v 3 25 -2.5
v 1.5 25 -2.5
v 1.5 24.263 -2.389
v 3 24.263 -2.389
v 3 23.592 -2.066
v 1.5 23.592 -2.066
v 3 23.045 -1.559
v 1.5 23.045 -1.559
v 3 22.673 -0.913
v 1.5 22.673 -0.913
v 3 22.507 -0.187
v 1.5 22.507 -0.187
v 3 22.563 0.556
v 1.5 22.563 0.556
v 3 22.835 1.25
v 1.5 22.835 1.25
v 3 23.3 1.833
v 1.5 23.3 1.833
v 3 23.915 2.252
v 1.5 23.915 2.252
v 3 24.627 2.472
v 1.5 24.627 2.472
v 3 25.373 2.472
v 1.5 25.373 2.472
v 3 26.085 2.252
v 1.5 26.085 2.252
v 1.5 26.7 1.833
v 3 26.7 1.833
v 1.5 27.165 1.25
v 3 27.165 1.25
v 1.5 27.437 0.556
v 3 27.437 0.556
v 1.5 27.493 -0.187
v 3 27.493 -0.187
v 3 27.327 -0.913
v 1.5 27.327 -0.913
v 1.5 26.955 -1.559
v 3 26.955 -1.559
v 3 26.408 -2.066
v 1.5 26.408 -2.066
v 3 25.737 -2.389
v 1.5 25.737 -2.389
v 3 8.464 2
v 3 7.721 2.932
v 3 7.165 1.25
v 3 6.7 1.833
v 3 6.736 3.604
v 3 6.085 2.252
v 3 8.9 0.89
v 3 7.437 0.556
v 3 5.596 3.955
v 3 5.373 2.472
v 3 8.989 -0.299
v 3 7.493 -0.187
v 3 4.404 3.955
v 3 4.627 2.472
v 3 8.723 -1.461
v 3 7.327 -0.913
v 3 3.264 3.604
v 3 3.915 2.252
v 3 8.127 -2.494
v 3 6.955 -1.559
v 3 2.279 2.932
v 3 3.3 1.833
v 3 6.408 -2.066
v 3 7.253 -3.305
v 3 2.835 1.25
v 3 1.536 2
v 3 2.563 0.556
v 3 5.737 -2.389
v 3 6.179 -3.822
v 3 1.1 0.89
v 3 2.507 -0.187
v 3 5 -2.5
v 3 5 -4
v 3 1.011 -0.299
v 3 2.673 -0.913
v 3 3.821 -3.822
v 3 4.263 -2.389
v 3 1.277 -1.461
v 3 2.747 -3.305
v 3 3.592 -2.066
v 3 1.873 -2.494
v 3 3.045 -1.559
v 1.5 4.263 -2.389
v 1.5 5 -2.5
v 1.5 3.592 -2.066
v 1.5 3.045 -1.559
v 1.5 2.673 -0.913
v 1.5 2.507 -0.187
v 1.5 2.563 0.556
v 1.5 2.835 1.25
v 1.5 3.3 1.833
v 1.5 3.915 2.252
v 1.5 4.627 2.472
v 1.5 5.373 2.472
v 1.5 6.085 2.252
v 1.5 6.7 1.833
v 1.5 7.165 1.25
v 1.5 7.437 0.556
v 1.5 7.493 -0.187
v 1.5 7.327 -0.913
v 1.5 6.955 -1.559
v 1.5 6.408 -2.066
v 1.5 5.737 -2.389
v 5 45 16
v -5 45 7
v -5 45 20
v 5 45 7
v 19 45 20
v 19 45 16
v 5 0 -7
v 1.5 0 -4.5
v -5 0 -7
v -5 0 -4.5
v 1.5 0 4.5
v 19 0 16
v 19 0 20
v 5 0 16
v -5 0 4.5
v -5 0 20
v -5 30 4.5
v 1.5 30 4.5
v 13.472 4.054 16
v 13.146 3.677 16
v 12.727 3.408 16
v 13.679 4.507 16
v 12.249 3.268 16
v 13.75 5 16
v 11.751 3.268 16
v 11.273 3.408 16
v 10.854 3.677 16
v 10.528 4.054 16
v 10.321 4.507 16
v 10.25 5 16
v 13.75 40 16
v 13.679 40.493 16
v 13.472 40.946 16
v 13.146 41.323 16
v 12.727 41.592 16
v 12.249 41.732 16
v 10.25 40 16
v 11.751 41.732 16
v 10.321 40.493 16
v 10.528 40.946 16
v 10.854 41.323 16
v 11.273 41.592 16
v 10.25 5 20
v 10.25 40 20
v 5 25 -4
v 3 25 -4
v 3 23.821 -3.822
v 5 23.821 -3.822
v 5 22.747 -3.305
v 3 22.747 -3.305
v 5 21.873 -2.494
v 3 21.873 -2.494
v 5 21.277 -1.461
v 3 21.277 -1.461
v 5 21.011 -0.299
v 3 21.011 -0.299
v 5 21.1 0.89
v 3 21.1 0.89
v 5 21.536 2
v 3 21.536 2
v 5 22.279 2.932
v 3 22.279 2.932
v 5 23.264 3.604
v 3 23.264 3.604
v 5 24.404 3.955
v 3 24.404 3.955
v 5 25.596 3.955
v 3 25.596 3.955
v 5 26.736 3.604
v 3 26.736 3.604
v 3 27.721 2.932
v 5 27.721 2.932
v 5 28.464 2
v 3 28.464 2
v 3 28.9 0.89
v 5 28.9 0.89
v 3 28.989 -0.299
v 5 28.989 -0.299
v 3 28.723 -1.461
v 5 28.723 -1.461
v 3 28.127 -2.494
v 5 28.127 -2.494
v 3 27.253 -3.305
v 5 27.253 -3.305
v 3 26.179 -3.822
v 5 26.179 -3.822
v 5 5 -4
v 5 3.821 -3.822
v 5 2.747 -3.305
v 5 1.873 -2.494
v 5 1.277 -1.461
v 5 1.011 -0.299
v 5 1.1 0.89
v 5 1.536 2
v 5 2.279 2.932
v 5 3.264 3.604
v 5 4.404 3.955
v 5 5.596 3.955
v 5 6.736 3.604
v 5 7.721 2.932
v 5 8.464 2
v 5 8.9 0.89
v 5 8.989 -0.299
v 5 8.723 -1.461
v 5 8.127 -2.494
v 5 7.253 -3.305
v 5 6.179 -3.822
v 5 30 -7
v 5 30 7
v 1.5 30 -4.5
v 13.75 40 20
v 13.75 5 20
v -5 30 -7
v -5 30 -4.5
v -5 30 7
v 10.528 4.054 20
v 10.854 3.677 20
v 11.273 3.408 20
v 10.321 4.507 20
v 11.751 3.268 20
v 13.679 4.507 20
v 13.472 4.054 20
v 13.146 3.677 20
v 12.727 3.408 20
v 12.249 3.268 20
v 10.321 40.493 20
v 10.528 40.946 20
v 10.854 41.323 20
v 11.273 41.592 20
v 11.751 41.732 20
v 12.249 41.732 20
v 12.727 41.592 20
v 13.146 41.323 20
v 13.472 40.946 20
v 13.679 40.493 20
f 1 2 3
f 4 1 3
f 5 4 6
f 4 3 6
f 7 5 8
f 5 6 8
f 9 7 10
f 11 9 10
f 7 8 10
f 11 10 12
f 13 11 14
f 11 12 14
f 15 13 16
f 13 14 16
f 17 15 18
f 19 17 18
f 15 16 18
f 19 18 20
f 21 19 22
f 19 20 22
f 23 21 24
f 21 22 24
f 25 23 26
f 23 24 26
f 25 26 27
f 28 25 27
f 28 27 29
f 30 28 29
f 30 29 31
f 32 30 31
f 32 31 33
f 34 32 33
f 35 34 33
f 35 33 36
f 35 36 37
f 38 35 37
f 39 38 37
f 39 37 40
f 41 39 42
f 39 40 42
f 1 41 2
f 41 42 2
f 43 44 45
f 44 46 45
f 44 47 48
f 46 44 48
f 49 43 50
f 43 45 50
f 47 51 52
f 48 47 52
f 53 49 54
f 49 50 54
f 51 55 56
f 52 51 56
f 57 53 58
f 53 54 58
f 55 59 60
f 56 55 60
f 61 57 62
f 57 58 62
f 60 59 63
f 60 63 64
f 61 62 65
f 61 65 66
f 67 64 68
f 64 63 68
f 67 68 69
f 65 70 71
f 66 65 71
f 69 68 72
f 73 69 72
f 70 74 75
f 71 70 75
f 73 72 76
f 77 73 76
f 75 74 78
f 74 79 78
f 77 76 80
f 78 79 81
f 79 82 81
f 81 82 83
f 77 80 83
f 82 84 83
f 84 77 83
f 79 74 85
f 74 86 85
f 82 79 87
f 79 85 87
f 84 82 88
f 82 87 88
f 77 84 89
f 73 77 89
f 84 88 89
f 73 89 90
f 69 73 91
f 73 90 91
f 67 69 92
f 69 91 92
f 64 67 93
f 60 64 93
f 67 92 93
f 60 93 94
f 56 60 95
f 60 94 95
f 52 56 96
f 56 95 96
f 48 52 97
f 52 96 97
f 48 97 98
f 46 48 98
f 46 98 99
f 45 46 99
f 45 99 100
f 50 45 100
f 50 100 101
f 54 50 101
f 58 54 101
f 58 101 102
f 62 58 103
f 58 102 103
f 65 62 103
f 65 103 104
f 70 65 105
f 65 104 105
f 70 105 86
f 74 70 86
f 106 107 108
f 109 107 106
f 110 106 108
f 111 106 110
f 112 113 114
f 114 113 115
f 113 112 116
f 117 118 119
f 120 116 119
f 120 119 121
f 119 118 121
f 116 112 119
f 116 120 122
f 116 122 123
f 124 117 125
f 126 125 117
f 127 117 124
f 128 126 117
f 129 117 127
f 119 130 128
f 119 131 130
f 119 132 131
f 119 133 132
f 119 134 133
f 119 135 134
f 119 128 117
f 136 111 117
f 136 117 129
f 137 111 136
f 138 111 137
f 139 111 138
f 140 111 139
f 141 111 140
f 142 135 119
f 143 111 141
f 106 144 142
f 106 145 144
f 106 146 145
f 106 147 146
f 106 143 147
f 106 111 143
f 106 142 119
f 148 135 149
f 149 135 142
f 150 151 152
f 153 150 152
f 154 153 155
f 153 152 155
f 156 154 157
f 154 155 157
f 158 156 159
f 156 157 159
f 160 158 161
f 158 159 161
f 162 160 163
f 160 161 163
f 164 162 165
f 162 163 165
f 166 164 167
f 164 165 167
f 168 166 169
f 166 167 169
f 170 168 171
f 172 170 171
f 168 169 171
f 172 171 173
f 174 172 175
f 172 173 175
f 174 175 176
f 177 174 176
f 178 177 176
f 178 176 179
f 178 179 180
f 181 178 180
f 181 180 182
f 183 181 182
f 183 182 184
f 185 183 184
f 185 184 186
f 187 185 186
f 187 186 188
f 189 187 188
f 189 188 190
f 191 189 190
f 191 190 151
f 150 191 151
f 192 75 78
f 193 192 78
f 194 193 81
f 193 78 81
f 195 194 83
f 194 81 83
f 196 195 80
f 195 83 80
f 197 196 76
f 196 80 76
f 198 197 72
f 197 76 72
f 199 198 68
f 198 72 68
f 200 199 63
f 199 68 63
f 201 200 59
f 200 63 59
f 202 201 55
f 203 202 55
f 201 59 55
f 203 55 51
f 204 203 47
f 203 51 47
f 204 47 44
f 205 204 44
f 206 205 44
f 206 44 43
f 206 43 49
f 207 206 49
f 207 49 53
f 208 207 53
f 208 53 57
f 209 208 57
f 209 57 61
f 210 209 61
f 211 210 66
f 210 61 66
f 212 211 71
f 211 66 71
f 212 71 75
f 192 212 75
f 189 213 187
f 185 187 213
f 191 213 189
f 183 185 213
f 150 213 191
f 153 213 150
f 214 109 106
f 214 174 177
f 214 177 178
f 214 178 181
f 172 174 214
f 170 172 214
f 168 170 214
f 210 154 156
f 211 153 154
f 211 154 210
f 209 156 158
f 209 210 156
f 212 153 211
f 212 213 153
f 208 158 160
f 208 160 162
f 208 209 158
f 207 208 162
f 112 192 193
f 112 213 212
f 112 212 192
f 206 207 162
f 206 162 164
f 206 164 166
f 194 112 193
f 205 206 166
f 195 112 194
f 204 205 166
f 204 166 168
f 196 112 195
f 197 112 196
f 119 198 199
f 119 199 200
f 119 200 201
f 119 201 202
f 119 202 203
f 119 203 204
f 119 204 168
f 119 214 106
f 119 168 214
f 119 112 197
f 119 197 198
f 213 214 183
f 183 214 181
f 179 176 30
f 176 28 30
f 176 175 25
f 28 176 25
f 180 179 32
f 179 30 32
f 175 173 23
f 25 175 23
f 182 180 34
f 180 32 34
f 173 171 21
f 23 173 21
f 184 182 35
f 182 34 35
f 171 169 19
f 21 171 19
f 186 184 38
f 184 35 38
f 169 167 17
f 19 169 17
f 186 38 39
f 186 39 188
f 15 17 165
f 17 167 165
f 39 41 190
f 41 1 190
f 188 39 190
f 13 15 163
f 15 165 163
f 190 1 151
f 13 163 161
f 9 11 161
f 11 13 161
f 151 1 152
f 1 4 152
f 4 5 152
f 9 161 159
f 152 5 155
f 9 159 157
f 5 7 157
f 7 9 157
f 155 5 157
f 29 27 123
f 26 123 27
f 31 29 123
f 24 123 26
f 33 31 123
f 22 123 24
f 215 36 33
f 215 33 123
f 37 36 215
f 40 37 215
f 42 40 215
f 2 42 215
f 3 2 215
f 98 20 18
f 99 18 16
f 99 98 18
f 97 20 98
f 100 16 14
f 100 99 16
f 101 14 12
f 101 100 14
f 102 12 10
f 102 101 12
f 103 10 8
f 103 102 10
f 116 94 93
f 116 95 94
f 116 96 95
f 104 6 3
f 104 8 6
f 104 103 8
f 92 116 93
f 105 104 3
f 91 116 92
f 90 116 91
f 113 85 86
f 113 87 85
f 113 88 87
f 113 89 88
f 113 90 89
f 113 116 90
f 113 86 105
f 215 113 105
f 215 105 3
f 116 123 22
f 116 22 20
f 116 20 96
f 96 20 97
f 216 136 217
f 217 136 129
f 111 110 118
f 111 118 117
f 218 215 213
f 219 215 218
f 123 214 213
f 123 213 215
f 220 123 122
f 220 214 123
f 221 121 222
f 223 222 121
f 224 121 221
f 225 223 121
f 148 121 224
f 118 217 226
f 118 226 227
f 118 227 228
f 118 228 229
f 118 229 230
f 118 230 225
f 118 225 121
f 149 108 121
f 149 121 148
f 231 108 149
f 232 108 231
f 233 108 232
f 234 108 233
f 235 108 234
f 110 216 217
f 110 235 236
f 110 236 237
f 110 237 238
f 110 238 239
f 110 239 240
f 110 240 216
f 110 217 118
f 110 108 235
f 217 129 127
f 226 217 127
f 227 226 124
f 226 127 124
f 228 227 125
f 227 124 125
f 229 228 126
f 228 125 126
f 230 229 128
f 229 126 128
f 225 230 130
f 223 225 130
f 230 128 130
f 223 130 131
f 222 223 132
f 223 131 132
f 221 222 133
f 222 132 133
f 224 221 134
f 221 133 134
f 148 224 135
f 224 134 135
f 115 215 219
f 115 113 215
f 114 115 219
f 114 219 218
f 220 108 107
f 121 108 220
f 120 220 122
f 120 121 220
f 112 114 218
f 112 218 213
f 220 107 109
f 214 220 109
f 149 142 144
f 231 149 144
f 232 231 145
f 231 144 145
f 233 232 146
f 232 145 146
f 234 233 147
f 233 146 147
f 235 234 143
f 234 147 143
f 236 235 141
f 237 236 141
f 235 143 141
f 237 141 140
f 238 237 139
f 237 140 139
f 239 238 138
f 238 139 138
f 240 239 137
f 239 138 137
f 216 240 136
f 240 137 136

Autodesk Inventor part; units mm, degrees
ref_plane "YZ Plane" through (0, 0, 0) normal (1, 0, 0) x (0, 1, 0)
ref_plane "XZ Plane" through (0, 0, 0) normal (0, 1, 0) x (-1, 0, 0)
ref_plane "XY Plane" through (0, 0, 0) normal (0, 0, 1) x (1, 0, 0)
sketch "Skizze1" plane through (0, 0, 0) normal (0, 1, 0) x (-1, 0, 0)
  line L0 (-5, 7) -> (5, 7)
  line L1 (5, 7) -> (5, -7)
  line L2 (5, -7) -> (-5, -7)
  line L3 (-5, -7) -> (-5, 7)
  line L4 (-5, 7) -> (5, -7) construction
  line L5 (5, 7) -> (-5, -7) construction
  line L6 (5, 4.5) -> (-1.5, 4.5)
  line L7 (-1.5, 4.5) -> (-1.5, -4.5)
  line L8 (-1.5, -4.5) -> (5, -4.5)
  line L9 (5, -4.5) -> (5, 4.5)
  line L10 (5, 4.5) -> (-1.5, -4.5) construction
  line L11 (-1.5, 4.5) -> (5, -4.5) construction
  line L12 (7, 0) -> (-7, 0) projected
  point P0 (0, 0)
  point P1 (1.75, 0)
  point P2 (1.75, 0)
  dimension "d0" = 10
  dimension "d1" = 14
  dimension "d2" = 6.5
  dimension "d3" = 9
extrude "Extrusion1" add sketch "Skizze1" along normal blind 30 contours L0 L1 L6 L7 L12 L3 | L12 L7 L8 L1 L2 L3
sketch "Skizze2" plane through (5, 0, 7) normal (1, 0, 0) x (0, 0, -1)
  line L0 (7, -6) -> (7, 36) construction
  point P0 (7, 0)
  point P1 (7, 25)
  point P2 (7, 5)
  dimension "d6" = 20
  dimension "d7" = 5
hole "Bohrung1" at (5, 25, 0) at (5, 5, 0) direction (-1, 0, 0) diameter 5 end through all counterbore diameter 8 counterbore depth 2
sketch "Skizze3" plane through (0, 30, 0) normal (0, 1, 0) x (1, 0, 0)
  line L0 (-5, 4.5) -> (1.5, 4.5) projected
  line L1 (1.5, 4.5) -> (1.5, -4.5) projected
  line L2 (1.5, -4.5) -> (-5, -4.5) projected
  line L3 (-5, -4.5) -> (-5, -7) projected
  line L4 (-5, -7) -> (5, -7) projected
  line L5 (5, -7) -> (5, 7) projected
  line L6 (5, 7) -> (-5, 7) projected
  line L7 (-5, 7) -> (-5, 4.5) projected
  line L8 (5, 7) -> (-5, 7) projected
  line L9 (-5, -7) -> (-5, -20)
  line L10 (-5, -20) -> (19, -20)
  line L11 (19, -20) -> (19, -16)
  line L12 (19, -16) -> (5, -16)
  line L13 (5, -7) -> (5, 7) projected
  line L14 (5, -16) -> (5, -7)
  point P0 (0, 0)
  dimension "d16" = 20
  dimension "d17" = 14
  dimension "d18" = 4
extrude "Extrusion2" add sketch "Skizze3" against normal blind 30 and the other way blind 15 contours L14 L12 L11 L10 L9 L4
sketch "Skizze4" plane through (19, 0, 16) normal (0, 0, -1) x (-1, 0, 0)
  line L0 (0, 0) -> (0, 45) projected
  line L1 (14, 0) -> (0, 0) projected
  line L2 (14, 0) -> (14, 45) projected
  line L3 (0, 45) -> (14, 45) projected
  line L4 (24, 45) -> (0, 45) projected
  line L5 (7, 45) -> (7, 0) construction
  line L6 (14, 0) -> (0, 0) projected
  line L7 (7, 40) -> (7, 5) construction
  line L8 (5.25, 40) -> (5.25, 5)
  line L9 (8.75, 5) -> (8.75, 40)
  arc A0 (8.75, 40) -> (5.25, 40) centre (7, 40) ccw
  arc A1 (5.25, 5) -> (8.75, 5) centre (7, 5) ccw
  point P0 (19, 0)
  point P1 (7, 22.5)
  dimension "d23" = 3.5
  dimension "d24" = 5
  dimension "d25" = 5
extrude "Extrusion3" cut sketch "Skizze4" against normal blind 30 contours A0 L9 A1 L8
properties part number "Schlitten_Part2"
